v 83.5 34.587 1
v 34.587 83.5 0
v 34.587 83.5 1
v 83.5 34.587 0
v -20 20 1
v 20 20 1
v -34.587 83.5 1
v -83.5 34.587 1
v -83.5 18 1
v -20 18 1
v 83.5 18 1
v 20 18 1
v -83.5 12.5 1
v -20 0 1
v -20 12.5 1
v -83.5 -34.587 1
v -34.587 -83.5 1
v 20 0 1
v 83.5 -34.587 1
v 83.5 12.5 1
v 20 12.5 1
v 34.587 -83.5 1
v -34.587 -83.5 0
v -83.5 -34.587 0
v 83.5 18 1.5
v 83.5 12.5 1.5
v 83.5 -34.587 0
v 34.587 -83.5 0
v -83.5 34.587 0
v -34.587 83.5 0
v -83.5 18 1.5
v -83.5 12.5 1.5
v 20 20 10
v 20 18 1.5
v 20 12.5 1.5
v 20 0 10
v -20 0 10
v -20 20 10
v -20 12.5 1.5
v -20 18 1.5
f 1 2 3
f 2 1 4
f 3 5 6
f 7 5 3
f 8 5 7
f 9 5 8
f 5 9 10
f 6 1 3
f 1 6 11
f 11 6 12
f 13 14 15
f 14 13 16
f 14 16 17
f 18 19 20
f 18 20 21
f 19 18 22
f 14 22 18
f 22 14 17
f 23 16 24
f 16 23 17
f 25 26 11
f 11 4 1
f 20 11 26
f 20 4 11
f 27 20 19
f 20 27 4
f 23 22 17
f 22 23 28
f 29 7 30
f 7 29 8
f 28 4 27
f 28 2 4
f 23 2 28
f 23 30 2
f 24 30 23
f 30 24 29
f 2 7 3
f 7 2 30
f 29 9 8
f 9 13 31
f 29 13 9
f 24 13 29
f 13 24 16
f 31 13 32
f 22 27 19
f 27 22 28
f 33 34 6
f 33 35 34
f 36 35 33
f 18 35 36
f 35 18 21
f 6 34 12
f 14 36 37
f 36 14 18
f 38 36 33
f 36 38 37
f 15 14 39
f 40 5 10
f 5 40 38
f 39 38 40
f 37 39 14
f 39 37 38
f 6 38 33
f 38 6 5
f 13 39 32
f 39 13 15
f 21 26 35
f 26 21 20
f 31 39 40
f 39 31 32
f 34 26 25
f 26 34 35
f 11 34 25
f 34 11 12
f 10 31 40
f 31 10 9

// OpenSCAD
// Generated by DescriptiveCAD bootstrap v0.2
  // boundary visualization
  linear_extrude(height=1.0) polygon(points=[[-34.586832, 83.500000], [34.586832, 83.500000], [83.500000, 34.586832], [83.500000, -34.586832], [34.586832, -83.500000], [-34.586832, -83.500000], [-83.500000, -34.586832], [-83.500000, 34.586832]]);
  translate([0,0,0]) linear_extrude(height=10) polygon(points=[[-20.000000, 20.000000], [20.000000, 20.000000], [20.000000, 0.000000], [-20.000000, 0.000000]]);
  translate([0,0,0.0]) linear_extrude(height=1.5) polygon(points=[[-83.500000, 18.000000], [-83.500000, 12.500000], [83.500000, 12.500000], [83.500000, 18.000000]]);
